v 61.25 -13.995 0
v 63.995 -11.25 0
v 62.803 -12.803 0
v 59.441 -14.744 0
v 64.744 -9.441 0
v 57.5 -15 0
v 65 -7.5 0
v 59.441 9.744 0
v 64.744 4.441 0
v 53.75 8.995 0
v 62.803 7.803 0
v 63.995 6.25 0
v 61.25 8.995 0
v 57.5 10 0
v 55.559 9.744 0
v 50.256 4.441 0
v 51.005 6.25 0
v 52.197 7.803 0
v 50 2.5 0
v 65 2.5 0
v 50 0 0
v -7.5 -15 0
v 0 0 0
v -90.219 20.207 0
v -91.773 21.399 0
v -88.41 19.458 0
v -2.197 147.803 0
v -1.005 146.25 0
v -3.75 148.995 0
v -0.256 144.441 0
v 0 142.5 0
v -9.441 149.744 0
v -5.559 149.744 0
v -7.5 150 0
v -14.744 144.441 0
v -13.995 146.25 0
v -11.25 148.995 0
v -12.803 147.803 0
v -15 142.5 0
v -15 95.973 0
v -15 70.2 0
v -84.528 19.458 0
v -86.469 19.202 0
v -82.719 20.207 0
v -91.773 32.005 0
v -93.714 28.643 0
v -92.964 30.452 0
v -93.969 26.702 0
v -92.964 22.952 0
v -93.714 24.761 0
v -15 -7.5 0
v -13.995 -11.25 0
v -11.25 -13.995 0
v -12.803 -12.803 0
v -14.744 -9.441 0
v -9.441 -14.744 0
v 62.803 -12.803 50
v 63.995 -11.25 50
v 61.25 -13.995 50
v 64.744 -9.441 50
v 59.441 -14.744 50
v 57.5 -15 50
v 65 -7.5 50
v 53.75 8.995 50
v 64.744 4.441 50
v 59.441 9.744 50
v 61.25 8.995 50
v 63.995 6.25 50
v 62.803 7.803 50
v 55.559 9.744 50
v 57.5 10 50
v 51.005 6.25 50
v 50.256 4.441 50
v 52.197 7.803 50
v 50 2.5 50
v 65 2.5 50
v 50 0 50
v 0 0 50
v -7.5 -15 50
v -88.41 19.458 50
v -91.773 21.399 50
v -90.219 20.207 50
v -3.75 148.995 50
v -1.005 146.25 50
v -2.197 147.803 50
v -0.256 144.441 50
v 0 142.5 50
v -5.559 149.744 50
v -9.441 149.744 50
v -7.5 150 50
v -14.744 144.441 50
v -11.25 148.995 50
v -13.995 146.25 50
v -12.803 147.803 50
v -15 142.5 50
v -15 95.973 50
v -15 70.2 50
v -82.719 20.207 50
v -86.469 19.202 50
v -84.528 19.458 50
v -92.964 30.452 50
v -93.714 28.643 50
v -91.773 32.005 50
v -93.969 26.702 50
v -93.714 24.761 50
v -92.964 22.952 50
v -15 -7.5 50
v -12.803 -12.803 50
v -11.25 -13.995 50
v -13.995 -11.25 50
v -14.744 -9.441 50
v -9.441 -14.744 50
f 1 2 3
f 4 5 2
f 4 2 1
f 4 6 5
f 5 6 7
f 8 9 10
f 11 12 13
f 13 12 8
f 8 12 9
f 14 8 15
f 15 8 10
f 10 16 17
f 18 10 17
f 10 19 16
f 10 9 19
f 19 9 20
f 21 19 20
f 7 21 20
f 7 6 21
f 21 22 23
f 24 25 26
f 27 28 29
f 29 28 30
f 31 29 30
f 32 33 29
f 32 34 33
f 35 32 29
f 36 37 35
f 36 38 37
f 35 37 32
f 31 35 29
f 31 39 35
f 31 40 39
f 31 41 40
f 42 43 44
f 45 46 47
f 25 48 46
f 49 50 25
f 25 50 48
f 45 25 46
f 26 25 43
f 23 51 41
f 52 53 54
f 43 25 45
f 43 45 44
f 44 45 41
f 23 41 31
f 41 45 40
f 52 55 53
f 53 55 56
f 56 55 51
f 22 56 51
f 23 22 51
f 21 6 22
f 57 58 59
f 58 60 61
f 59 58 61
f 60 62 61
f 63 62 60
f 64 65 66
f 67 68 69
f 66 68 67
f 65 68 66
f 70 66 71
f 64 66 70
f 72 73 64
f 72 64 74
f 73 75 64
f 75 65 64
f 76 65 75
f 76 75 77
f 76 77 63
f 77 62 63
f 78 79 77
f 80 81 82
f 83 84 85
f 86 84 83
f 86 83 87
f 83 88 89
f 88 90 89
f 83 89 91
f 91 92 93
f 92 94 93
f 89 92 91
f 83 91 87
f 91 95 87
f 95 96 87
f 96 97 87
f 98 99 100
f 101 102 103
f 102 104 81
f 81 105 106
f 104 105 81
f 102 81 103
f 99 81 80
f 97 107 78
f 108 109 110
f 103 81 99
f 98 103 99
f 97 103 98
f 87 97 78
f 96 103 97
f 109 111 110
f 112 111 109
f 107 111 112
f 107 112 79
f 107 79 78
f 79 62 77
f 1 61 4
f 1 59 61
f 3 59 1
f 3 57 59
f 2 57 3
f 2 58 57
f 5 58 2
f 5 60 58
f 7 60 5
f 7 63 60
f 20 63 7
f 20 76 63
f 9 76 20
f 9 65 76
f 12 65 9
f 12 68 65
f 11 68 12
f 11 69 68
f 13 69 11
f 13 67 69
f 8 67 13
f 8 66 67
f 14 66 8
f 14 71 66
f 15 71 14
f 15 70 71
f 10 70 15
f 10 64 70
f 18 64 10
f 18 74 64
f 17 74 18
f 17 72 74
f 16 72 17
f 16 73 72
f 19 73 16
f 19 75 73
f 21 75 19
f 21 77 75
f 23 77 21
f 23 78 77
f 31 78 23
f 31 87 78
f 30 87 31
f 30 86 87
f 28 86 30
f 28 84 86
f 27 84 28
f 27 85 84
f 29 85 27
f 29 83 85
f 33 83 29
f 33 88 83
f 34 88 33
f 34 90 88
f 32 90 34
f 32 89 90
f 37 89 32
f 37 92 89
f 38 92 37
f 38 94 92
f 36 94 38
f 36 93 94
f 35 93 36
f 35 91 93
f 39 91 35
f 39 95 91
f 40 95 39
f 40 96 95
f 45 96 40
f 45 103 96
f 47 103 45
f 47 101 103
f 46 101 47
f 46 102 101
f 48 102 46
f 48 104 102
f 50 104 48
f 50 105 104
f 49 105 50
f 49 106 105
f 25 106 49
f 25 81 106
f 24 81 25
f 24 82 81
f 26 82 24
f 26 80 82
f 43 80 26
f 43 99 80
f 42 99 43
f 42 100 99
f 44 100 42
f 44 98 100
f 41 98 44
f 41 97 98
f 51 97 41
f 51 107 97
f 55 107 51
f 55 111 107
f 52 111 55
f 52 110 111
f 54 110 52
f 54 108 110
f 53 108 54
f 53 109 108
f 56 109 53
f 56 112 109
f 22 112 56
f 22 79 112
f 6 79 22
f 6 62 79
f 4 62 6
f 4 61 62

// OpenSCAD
//CUSTOMIZER VARIABLES

// The width of the stand when looking from the front
stand_width = 50;

// The depth of the spot in which the stood object sits
bottom_depth = 50;

// The height of the stand measured up the backrest
backrest_height = 150;

// The angle that the stood object leans back
lean_angle = 20;

// The distance between the points of contact when the stand is leaned back
base_distance = 100;

// The height at which the prop intersects with the backrest
join_height = 100;

// The height of the lip
lip_height = 10;

// The thickness of all parts of the stand
structure_thickness = 15;

// Whether to place an edge holder on the side(s) of the stand
edge_holder = 0; // [0:None, 1:Left, 2:Right, 3:Both]

//CUSTOMIZER VARIABLES END

module stand(width=stand_width, depth=bottom_depth, height=backrest_height, angle=lean_angle, base=base_distance, join=join_height, lip=lip_height, thickness=structure_thickness, edge=edge_holder) {
    backrest_top = [-(thickness/2),height-(thickness/2),0];
    backrest_bottom = [-(thickness/2),-(thickness/2),0];
    holder_front = [depth+(thickness/2),-(thickness/2),0];
    lip_top = [depth+(thickness/2),lip -(thickness/2),0];
    prop_join = [-(thickness/2),join-(thickness/2),0];
    prop_bottom = [-cos(angle) * base + (thickness/2),sin(angle) * base - (thickness/2),0];
    
    // Add some width to accomodate the edges, if included
    total_width = width + ((edge == 1 || edge == 3) ? thickness : 0) + ((edge == 2 || edge == 3) ? thickness : 0);
    
    // Flip the whole thing over for easier printing if there's a holder on the left side
    rotate_all = edge == 1 ? [0, 180, 0] : [0, 0, 0];
    translate_all = edge == 1 ? [0, 0, total_width] : [0, 0, 0];

    translate(translate_all) rotate(rotate_all) {
        linear_extrude(height = total_width)
        {
            // Backrest
            hull() {
                translate(backrest_top) circle(d=thickness);
                translate(backrest_bottom) circle(d=thickness);
            }
            // Stand
            hull() {
                translate(prop_join) circle(d=thickness);
                translate([prop_join[0],max(prop_join[1]-thickness/2, -thickness/2),prop_join[2]]) circle(d=thickness);
                translate(prop_bottom) circle(d=thickness);
            }
            // Holder
            hull() {
                translate(backrest_bottom) circle(d=thickness);
                translate(holder_front) circle(d=thickness);
            }
            // Lip
            hull() {
                translate(holder_front) circle(d=thickness);
                translate(lip_top) circle(d=thickness);
            }
        }
        // Left edge holder
        if (edge == 1 || edge == 3) {
            translate([0, 0, total_width - thickness]) linear_extrude(height = thickness)
            hull() {
                translate(backrest_top) circle(d=thickness);
                translate(backrest_bottom) circle(d=thickness);
                translate(holder_front) circle(d=thickness);
                translate(lip_top) circle(d=thickness);
            }
        }
        // Right edge holder
        if (edge == 2 || edge == 3) {
            linear_extrude(height = thickness)
            hull() {
                translate(backrest_top) circle(d=thickness);
                translate(backrest_bottom) circle(d=thickness);
                translate(holder_front) circle(d=thickness);
                translate(lip_top) circle(d=thickness);
	        }
        }
    }
}

stand();
